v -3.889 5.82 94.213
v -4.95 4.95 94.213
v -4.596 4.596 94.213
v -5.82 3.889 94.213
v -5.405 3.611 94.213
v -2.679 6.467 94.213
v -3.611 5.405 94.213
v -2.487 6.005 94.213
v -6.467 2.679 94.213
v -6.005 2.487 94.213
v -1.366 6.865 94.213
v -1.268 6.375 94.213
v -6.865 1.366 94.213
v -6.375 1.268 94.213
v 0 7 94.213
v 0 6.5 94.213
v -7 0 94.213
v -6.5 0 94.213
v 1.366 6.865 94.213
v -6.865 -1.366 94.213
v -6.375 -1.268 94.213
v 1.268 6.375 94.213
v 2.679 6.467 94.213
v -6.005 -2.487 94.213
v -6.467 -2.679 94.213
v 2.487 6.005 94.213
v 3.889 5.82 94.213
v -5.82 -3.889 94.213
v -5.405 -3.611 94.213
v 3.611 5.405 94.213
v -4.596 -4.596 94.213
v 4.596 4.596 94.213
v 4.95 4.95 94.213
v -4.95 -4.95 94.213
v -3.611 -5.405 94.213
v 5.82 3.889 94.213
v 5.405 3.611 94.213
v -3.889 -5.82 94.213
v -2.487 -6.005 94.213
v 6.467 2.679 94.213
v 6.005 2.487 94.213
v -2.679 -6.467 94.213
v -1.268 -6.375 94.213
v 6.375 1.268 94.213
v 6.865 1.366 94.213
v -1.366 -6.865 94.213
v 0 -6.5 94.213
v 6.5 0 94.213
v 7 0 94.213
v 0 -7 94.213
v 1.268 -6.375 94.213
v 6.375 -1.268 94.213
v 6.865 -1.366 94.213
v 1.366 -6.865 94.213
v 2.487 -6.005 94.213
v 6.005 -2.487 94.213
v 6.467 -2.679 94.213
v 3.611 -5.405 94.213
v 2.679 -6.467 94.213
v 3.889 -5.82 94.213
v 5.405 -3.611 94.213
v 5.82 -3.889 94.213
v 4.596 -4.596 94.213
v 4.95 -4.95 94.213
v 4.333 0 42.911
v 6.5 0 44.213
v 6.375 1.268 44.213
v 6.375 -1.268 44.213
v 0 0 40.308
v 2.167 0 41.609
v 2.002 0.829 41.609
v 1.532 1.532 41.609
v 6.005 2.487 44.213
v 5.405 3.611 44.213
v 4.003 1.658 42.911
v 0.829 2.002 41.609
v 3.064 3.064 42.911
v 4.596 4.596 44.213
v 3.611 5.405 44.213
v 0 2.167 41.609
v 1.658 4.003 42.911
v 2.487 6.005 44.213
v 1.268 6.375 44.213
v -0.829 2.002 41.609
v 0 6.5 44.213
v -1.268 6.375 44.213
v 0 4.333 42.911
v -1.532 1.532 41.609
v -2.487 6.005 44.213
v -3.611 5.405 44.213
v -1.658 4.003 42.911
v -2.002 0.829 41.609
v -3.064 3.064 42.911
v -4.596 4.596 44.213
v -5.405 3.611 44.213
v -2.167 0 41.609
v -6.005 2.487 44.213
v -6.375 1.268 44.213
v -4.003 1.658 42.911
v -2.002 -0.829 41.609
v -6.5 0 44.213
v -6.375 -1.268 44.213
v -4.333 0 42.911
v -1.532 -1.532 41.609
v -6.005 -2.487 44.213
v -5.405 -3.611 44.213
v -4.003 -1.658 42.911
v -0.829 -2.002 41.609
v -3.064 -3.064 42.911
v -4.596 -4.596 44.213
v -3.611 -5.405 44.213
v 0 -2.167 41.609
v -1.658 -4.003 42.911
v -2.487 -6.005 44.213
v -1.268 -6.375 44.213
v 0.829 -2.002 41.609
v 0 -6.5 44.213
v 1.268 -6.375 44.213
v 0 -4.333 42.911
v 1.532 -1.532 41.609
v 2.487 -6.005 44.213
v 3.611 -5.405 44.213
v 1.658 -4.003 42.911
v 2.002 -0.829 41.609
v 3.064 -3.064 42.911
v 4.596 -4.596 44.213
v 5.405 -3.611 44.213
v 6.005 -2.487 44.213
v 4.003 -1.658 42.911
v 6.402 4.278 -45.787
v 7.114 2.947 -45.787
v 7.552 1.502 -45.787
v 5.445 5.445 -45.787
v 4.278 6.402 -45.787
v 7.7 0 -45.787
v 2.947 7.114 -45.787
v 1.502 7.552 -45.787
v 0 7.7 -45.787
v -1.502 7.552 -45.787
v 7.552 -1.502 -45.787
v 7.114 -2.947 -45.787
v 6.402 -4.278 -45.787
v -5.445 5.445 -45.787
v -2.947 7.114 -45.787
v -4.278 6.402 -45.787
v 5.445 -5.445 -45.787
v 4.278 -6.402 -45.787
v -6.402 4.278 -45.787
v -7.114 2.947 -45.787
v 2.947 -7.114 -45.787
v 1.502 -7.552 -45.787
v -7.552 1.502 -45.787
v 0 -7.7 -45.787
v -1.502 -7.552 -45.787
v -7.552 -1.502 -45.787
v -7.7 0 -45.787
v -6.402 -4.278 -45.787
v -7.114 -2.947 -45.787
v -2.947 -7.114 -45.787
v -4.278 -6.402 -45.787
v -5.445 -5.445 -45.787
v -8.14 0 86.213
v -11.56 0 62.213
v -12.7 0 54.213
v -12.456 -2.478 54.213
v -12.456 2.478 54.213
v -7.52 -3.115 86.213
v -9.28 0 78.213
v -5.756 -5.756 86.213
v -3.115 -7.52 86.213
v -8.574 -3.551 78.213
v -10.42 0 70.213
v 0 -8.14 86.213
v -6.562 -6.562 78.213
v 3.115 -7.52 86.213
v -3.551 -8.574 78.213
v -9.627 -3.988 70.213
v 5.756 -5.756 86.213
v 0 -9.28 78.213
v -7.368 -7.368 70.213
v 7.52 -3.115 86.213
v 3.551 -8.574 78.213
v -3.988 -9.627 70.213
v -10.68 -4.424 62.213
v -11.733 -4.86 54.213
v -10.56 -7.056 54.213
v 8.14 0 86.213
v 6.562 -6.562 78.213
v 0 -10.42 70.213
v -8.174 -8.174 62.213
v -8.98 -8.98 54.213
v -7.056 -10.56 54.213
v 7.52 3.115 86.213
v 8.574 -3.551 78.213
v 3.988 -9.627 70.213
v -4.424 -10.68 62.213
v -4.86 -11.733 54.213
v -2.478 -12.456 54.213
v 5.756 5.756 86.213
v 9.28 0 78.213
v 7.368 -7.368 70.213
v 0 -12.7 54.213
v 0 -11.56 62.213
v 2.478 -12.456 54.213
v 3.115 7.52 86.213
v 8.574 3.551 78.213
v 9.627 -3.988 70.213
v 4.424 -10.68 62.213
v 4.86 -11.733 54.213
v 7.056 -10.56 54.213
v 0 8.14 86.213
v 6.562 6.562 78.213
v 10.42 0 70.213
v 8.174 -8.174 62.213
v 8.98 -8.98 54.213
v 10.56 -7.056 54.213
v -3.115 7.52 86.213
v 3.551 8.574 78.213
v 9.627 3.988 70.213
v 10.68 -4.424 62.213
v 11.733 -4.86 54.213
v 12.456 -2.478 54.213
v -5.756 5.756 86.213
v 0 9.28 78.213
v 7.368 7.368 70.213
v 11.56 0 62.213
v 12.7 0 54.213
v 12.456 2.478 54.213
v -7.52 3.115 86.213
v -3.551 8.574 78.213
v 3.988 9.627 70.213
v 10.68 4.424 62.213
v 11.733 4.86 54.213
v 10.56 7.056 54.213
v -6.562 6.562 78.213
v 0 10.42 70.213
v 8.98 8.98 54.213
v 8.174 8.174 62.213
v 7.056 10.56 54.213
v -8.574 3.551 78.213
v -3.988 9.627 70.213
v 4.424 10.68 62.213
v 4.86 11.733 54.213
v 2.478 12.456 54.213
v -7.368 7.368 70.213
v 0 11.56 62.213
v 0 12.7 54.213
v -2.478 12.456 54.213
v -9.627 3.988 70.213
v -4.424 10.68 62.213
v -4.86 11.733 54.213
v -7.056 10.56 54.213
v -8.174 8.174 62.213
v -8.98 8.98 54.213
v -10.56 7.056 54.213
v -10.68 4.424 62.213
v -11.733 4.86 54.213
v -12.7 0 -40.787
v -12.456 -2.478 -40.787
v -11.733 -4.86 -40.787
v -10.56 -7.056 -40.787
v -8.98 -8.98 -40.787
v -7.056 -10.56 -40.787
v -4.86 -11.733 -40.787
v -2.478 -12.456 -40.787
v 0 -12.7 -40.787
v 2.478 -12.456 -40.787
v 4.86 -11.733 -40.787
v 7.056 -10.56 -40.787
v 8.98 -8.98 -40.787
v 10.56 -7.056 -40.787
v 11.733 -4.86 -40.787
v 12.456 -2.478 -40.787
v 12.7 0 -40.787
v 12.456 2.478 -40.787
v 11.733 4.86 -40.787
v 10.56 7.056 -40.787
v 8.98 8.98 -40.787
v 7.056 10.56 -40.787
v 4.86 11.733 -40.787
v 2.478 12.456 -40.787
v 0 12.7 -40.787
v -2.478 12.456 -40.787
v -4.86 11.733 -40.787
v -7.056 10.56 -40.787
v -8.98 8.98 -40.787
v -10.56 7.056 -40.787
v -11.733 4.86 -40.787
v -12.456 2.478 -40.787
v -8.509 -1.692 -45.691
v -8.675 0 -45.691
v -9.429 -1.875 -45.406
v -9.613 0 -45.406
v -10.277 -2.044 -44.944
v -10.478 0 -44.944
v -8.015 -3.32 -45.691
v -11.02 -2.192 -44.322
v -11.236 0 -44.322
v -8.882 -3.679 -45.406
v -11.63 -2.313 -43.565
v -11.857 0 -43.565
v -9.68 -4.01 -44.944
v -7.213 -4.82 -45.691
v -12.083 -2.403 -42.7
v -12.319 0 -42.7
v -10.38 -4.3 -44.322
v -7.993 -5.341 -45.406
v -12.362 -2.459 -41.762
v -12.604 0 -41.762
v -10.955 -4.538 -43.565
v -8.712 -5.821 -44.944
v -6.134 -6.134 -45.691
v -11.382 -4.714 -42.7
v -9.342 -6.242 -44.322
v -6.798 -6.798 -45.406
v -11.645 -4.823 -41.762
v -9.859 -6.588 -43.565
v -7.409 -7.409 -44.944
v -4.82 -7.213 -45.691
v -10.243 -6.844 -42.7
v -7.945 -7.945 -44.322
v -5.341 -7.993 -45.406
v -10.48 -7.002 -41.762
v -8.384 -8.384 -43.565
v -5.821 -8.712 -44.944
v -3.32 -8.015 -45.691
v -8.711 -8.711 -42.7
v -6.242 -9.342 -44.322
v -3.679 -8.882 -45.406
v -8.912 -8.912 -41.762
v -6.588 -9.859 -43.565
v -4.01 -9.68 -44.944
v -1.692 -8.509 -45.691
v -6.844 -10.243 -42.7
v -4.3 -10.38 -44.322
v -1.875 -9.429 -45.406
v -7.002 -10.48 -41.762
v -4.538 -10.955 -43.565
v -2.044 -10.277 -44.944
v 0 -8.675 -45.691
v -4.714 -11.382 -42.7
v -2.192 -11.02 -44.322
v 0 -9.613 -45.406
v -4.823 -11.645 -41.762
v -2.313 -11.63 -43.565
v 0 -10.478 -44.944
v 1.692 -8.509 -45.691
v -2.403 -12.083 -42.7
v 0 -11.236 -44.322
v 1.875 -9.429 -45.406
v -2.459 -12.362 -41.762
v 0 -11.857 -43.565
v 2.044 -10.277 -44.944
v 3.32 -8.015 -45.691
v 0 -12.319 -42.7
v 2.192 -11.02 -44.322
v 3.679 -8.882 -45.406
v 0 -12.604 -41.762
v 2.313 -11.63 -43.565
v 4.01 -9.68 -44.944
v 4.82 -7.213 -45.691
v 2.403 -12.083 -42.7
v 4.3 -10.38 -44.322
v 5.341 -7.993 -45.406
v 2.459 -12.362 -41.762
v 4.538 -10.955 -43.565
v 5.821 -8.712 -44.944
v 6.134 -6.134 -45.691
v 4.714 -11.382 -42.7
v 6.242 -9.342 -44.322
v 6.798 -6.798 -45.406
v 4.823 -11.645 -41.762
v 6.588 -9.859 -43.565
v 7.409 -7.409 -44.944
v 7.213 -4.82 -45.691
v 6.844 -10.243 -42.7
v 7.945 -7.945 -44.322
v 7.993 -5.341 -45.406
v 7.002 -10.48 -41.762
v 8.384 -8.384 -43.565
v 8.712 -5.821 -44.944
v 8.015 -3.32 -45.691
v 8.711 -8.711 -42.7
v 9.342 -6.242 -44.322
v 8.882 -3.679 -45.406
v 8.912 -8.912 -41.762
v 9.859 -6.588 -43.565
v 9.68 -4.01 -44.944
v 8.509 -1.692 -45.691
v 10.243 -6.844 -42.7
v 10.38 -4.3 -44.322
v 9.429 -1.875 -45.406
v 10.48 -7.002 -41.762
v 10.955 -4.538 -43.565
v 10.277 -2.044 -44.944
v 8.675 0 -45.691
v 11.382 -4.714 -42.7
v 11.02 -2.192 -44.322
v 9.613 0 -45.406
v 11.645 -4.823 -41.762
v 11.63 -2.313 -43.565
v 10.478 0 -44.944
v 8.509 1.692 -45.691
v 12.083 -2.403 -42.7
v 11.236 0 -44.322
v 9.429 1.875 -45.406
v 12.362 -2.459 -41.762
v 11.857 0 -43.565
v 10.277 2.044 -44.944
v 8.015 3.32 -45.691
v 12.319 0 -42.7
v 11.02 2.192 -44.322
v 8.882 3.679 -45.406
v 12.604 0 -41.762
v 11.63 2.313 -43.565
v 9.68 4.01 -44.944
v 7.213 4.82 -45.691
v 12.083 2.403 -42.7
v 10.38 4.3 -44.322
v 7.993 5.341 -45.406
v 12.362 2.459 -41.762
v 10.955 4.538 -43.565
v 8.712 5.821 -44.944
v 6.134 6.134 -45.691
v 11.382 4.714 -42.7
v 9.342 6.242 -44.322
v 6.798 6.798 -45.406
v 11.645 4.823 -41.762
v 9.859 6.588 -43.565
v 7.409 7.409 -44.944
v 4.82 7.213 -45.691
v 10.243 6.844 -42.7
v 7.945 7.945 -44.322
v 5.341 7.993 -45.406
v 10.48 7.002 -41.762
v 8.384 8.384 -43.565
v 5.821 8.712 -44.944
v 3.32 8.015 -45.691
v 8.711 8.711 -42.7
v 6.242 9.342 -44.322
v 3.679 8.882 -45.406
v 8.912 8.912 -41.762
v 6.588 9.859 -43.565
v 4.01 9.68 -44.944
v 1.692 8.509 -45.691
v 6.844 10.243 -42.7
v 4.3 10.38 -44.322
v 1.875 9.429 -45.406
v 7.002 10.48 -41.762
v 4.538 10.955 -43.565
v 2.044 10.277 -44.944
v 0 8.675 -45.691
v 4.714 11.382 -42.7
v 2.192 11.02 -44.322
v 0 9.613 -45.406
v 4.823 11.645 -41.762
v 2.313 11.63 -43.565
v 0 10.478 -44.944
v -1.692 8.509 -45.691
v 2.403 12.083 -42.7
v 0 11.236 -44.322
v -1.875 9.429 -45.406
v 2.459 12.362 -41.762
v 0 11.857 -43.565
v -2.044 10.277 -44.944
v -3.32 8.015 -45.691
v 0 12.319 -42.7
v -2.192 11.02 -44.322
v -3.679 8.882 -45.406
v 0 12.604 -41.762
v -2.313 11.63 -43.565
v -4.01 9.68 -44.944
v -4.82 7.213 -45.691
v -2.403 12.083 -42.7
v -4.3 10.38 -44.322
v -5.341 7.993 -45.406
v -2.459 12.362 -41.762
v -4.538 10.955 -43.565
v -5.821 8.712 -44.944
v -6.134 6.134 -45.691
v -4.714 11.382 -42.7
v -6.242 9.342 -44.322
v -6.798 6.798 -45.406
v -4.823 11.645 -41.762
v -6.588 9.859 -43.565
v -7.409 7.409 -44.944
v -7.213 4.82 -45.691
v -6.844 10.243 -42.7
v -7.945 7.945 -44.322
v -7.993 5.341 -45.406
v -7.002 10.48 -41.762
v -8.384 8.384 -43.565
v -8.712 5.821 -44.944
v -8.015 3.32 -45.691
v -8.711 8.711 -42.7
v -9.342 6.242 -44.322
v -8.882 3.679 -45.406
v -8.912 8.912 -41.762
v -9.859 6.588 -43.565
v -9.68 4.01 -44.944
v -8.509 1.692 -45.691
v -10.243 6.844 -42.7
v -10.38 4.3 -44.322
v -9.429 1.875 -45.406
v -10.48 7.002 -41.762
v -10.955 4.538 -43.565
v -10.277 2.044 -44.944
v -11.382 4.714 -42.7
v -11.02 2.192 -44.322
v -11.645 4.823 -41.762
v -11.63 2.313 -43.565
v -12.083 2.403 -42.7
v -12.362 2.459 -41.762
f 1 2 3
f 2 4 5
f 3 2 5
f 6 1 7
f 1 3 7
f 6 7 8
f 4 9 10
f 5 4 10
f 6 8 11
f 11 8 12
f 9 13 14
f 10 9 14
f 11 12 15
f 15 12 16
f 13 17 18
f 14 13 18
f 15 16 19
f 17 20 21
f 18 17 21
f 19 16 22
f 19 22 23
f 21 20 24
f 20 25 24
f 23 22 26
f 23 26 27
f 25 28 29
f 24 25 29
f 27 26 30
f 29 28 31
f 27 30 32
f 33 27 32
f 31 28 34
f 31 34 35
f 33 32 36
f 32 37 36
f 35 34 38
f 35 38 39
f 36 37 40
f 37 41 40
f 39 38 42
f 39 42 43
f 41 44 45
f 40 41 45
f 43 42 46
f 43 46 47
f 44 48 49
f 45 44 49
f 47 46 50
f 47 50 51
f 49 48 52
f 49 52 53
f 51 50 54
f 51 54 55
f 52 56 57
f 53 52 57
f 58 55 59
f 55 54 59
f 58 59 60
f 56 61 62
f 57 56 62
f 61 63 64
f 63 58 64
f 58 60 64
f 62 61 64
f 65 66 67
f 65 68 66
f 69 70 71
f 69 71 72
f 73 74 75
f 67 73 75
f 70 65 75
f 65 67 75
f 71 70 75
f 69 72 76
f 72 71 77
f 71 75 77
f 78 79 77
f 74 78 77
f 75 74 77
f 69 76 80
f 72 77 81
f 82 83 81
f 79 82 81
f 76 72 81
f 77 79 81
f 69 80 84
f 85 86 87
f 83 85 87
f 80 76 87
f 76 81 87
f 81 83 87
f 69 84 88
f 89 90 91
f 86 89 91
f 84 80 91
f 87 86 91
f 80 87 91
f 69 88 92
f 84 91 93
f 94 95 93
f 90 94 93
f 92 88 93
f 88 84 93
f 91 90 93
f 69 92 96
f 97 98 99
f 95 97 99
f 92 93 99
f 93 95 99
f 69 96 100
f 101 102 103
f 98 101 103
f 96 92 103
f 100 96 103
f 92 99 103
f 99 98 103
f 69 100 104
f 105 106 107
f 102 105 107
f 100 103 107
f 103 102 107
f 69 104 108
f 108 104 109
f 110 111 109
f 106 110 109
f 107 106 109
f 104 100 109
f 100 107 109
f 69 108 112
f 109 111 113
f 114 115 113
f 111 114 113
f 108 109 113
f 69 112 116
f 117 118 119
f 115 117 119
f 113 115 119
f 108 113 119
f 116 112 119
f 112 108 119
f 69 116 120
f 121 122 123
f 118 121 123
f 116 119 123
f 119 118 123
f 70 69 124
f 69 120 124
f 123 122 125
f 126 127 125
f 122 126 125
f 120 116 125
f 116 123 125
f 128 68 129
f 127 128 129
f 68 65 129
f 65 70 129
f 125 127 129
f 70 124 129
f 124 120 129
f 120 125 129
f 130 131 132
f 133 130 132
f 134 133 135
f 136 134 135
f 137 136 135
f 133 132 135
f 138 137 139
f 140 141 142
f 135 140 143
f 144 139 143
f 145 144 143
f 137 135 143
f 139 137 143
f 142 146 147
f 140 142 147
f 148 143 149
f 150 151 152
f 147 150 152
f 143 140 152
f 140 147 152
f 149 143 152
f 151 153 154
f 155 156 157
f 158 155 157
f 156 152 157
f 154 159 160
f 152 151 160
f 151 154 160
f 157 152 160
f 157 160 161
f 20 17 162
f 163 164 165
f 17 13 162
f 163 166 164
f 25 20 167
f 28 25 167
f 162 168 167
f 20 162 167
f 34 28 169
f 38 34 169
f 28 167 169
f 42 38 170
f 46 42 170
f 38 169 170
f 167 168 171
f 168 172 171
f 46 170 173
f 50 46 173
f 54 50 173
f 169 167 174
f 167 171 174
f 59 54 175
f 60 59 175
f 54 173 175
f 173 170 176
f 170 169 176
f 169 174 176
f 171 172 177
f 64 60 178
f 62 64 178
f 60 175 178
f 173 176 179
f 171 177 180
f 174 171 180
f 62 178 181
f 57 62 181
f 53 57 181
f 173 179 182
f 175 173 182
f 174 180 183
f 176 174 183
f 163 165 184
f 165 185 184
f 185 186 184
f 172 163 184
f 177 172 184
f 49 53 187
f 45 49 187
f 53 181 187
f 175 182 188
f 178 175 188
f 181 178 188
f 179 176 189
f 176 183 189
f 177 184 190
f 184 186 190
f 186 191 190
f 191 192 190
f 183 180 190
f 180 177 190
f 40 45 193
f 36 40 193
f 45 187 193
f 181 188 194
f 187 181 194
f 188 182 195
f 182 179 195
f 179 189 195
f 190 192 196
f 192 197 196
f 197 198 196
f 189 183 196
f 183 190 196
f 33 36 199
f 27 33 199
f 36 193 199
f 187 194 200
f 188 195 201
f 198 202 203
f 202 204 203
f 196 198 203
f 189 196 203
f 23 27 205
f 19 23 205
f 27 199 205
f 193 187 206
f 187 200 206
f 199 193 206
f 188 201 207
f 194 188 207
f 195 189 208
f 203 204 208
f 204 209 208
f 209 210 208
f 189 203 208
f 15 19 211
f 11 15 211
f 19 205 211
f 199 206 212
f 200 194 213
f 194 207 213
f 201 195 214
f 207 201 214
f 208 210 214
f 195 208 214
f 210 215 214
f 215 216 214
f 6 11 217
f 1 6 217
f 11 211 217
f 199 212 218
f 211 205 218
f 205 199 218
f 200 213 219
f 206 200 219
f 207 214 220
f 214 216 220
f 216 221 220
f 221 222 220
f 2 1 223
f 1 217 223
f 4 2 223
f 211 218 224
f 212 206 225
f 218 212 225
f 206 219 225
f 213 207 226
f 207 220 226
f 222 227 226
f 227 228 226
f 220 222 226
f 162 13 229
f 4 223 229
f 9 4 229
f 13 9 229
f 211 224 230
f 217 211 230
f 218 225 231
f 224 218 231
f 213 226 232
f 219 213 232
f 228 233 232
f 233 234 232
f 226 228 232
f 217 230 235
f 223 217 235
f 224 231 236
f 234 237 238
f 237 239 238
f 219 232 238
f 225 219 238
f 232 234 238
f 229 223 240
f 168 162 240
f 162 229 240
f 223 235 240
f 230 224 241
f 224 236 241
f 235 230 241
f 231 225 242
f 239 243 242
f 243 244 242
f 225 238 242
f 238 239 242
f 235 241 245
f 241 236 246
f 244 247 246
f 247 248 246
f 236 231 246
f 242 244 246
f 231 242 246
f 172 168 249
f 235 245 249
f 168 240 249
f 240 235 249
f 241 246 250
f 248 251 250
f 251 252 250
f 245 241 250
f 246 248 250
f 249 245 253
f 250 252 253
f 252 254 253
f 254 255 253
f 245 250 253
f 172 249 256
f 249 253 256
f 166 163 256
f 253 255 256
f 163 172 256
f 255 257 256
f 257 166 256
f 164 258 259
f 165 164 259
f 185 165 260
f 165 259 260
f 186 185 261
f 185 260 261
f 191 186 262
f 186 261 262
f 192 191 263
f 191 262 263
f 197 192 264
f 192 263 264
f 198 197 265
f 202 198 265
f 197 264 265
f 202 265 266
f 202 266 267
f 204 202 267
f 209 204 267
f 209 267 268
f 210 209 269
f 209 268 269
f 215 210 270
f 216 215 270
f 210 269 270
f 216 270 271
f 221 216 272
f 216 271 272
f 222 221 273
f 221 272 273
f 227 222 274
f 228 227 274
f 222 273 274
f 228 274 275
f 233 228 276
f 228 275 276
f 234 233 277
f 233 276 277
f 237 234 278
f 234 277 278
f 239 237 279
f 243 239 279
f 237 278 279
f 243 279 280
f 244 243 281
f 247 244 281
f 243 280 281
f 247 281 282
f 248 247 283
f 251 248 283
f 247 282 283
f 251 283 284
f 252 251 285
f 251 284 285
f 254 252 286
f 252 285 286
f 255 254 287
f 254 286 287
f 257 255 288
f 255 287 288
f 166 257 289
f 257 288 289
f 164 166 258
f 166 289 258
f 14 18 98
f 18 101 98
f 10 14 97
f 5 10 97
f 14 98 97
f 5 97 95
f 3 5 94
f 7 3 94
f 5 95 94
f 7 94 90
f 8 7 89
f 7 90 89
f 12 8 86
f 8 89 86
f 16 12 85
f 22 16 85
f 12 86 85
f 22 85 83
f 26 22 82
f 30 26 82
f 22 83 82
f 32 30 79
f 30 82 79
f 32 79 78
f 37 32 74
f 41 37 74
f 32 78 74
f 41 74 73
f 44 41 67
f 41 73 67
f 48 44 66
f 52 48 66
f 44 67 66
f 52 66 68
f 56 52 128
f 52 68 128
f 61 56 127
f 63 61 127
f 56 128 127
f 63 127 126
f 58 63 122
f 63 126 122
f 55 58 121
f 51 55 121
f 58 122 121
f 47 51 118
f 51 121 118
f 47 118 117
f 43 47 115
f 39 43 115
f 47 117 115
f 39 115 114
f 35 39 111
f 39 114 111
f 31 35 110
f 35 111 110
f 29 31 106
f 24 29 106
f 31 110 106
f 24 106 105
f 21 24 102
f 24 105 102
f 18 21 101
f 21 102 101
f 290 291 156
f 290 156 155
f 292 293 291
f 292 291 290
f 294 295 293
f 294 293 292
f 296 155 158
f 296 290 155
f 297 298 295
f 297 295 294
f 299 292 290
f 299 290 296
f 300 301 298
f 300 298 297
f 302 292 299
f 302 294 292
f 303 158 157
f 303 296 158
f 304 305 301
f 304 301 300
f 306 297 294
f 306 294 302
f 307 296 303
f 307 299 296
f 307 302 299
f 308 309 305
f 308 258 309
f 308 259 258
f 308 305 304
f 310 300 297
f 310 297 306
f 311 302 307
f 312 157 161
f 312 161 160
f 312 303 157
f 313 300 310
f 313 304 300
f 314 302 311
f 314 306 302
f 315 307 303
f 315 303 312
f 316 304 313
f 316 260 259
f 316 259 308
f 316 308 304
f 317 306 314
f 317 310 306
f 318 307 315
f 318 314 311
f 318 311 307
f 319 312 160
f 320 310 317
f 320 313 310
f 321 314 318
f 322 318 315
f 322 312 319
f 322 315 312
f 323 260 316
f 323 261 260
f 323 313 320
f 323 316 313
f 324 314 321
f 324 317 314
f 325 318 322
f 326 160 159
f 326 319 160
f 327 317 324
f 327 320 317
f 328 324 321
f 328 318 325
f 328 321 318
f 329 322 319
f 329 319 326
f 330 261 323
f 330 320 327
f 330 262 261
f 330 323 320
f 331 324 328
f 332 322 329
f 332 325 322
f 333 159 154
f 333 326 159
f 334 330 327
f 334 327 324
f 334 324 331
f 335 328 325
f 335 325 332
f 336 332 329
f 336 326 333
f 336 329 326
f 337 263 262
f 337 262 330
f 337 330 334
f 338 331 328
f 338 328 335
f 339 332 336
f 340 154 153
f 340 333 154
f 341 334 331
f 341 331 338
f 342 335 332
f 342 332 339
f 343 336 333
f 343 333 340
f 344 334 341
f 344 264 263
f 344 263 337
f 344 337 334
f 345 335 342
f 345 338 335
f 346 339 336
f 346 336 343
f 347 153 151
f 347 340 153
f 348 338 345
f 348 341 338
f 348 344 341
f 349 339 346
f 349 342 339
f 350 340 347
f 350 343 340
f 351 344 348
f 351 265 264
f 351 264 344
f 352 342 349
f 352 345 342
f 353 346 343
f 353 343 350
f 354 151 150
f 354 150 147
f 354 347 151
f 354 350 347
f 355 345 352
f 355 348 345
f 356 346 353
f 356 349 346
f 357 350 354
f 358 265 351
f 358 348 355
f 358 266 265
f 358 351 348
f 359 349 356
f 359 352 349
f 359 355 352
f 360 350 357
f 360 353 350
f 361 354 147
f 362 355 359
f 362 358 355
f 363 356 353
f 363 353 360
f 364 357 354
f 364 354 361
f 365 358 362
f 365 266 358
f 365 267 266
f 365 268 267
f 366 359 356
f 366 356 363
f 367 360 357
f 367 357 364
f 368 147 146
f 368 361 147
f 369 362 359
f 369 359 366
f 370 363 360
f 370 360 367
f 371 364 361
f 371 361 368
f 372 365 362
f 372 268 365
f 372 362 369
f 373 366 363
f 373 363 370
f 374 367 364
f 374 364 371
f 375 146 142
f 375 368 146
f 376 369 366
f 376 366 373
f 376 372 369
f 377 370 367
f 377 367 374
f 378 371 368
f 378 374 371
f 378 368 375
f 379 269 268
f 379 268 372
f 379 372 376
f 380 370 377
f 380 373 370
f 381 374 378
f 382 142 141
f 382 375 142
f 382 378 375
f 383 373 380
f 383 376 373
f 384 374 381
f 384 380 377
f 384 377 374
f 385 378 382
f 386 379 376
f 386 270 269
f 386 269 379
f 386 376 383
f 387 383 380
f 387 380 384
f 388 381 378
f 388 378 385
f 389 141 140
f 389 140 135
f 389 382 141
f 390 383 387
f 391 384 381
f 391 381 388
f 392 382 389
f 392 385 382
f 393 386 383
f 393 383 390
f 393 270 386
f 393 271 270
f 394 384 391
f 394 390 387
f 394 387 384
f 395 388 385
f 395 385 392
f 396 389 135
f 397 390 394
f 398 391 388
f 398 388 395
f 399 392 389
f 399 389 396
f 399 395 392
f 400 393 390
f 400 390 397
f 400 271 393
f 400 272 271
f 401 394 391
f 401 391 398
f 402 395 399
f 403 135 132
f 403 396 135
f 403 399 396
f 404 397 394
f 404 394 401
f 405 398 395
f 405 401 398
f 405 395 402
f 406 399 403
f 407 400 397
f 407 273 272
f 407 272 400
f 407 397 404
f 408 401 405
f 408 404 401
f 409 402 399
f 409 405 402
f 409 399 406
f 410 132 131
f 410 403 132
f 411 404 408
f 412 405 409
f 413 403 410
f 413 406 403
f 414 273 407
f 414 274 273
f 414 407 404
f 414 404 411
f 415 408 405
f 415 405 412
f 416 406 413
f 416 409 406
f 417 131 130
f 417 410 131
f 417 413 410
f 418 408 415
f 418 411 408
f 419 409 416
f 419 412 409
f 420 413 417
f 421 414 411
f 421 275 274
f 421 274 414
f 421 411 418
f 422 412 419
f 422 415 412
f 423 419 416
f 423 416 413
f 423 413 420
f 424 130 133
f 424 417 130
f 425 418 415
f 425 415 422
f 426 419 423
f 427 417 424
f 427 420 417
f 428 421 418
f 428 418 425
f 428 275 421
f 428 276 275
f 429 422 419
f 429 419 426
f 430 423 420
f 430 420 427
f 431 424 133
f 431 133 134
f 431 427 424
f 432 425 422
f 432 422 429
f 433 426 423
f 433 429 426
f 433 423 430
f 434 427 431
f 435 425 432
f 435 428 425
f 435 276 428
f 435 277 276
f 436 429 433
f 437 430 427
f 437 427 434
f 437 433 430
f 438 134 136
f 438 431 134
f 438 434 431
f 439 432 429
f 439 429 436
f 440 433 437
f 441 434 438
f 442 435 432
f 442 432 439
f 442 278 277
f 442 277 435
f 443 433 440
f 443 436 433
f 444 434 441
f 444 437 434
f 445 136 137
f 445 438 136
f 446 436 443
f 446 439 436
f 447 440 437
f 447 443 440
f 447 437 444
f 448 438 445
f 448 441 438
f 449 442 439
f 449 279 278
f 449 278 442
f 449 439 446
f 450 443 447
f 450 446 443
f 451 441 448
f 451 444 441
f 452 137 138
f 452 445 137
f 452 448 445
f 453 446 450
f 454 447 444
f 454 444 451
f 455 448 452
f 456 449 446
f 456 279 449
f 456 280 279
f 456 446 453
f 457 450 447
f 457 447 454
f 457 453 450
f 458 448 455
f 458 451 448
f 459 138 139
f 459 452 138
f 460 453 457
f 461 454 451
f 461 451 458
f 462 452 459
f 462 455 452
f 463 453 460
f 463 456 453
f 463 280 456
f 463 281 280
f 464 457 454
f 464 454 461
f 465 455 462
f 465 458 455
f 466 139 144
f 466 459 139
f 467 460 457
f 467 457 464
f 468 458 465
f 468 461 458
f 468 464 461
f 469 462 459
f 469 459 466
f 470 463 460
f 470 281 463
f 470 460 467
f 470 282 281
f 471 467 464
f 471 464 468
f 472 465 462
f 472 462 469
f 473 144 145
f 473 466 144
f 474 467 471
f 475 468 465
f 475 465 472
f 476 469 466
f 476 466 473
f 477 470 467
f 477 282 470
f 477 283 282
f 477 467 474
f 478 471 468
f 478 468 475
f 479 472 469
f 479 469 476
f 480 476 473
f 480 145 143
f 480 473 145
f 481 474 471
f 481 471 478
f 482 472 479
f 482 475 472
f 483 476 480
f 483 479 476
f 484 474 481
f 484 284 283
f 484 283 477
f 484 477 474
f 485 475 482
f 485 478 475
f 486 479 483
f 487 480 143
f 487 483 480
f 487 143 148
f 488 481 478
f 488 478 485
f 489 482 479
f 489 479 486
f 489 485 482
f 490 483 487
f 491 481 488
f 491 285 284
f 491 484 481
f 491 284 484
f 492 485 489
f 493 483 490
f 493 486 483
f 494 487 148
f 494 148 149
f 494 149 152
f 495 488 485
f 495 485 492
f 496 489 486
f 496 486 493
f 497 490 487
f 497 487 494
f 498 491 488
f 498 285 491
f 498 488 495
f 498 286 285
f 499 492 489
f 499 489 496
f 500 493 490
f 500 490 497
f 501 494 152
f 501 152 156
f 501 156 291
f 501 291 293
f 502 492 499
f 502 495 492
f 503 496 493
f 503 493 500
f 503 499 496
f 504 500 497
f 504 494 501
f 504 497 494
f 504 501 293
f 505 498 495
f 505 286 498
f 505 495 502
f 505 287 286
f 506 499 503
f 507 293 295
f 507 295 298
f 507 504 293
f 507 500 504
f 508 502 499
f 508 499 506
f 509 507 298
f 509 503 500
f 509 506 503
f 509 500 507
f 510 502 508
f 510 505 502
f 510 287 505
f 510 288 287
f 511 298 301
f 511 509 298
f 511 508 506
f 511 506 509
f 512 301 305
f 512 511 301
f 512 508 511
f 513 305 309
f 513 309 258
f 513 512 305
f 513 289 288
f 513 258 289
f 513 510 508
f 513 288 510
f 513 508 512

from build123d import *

# Parameters (mm, degrees)
F3_D     = 13
F3_DEPTH = 50
F3_TIP   = 3.9055940237
F4_R     = 5


with BuildPart() as f1:
    # F0 (on Front) → F1 (revolve)
    with BuildSketch(Plane.XZ):
        Polygon((-12.7, -45.7867538678), (0, -45.7867538678), (0, 94.2131613321), (-7, 94.2131613321), (-12.7, 54.2132461322), align=None)
    revolve(axis=Axis((0, 0, 24.2132037321), (0, 0, 1)))

    # F3
    with Locations(Plane.XY.offset(94.2131613321)):
        with Locations((0, 0)):
            Hole(F3_D / 2, depth=F3_DEPTH)
            with Locations((0, 0, -(F3_DEPTH + F3_TIP / 2))):  # 118° drill point
                Cone(0, F3_D / 2, F3_TIP, mode=Mode.SUBTRACT)

    # F4
    f4_edges = [f1.edges().sort_by_distance(p)[0] for p in [
        (12.7, 0, -45.786754),
    ]]
    fillet(f4_edges, radius=F4_R)


solid = f1.part
